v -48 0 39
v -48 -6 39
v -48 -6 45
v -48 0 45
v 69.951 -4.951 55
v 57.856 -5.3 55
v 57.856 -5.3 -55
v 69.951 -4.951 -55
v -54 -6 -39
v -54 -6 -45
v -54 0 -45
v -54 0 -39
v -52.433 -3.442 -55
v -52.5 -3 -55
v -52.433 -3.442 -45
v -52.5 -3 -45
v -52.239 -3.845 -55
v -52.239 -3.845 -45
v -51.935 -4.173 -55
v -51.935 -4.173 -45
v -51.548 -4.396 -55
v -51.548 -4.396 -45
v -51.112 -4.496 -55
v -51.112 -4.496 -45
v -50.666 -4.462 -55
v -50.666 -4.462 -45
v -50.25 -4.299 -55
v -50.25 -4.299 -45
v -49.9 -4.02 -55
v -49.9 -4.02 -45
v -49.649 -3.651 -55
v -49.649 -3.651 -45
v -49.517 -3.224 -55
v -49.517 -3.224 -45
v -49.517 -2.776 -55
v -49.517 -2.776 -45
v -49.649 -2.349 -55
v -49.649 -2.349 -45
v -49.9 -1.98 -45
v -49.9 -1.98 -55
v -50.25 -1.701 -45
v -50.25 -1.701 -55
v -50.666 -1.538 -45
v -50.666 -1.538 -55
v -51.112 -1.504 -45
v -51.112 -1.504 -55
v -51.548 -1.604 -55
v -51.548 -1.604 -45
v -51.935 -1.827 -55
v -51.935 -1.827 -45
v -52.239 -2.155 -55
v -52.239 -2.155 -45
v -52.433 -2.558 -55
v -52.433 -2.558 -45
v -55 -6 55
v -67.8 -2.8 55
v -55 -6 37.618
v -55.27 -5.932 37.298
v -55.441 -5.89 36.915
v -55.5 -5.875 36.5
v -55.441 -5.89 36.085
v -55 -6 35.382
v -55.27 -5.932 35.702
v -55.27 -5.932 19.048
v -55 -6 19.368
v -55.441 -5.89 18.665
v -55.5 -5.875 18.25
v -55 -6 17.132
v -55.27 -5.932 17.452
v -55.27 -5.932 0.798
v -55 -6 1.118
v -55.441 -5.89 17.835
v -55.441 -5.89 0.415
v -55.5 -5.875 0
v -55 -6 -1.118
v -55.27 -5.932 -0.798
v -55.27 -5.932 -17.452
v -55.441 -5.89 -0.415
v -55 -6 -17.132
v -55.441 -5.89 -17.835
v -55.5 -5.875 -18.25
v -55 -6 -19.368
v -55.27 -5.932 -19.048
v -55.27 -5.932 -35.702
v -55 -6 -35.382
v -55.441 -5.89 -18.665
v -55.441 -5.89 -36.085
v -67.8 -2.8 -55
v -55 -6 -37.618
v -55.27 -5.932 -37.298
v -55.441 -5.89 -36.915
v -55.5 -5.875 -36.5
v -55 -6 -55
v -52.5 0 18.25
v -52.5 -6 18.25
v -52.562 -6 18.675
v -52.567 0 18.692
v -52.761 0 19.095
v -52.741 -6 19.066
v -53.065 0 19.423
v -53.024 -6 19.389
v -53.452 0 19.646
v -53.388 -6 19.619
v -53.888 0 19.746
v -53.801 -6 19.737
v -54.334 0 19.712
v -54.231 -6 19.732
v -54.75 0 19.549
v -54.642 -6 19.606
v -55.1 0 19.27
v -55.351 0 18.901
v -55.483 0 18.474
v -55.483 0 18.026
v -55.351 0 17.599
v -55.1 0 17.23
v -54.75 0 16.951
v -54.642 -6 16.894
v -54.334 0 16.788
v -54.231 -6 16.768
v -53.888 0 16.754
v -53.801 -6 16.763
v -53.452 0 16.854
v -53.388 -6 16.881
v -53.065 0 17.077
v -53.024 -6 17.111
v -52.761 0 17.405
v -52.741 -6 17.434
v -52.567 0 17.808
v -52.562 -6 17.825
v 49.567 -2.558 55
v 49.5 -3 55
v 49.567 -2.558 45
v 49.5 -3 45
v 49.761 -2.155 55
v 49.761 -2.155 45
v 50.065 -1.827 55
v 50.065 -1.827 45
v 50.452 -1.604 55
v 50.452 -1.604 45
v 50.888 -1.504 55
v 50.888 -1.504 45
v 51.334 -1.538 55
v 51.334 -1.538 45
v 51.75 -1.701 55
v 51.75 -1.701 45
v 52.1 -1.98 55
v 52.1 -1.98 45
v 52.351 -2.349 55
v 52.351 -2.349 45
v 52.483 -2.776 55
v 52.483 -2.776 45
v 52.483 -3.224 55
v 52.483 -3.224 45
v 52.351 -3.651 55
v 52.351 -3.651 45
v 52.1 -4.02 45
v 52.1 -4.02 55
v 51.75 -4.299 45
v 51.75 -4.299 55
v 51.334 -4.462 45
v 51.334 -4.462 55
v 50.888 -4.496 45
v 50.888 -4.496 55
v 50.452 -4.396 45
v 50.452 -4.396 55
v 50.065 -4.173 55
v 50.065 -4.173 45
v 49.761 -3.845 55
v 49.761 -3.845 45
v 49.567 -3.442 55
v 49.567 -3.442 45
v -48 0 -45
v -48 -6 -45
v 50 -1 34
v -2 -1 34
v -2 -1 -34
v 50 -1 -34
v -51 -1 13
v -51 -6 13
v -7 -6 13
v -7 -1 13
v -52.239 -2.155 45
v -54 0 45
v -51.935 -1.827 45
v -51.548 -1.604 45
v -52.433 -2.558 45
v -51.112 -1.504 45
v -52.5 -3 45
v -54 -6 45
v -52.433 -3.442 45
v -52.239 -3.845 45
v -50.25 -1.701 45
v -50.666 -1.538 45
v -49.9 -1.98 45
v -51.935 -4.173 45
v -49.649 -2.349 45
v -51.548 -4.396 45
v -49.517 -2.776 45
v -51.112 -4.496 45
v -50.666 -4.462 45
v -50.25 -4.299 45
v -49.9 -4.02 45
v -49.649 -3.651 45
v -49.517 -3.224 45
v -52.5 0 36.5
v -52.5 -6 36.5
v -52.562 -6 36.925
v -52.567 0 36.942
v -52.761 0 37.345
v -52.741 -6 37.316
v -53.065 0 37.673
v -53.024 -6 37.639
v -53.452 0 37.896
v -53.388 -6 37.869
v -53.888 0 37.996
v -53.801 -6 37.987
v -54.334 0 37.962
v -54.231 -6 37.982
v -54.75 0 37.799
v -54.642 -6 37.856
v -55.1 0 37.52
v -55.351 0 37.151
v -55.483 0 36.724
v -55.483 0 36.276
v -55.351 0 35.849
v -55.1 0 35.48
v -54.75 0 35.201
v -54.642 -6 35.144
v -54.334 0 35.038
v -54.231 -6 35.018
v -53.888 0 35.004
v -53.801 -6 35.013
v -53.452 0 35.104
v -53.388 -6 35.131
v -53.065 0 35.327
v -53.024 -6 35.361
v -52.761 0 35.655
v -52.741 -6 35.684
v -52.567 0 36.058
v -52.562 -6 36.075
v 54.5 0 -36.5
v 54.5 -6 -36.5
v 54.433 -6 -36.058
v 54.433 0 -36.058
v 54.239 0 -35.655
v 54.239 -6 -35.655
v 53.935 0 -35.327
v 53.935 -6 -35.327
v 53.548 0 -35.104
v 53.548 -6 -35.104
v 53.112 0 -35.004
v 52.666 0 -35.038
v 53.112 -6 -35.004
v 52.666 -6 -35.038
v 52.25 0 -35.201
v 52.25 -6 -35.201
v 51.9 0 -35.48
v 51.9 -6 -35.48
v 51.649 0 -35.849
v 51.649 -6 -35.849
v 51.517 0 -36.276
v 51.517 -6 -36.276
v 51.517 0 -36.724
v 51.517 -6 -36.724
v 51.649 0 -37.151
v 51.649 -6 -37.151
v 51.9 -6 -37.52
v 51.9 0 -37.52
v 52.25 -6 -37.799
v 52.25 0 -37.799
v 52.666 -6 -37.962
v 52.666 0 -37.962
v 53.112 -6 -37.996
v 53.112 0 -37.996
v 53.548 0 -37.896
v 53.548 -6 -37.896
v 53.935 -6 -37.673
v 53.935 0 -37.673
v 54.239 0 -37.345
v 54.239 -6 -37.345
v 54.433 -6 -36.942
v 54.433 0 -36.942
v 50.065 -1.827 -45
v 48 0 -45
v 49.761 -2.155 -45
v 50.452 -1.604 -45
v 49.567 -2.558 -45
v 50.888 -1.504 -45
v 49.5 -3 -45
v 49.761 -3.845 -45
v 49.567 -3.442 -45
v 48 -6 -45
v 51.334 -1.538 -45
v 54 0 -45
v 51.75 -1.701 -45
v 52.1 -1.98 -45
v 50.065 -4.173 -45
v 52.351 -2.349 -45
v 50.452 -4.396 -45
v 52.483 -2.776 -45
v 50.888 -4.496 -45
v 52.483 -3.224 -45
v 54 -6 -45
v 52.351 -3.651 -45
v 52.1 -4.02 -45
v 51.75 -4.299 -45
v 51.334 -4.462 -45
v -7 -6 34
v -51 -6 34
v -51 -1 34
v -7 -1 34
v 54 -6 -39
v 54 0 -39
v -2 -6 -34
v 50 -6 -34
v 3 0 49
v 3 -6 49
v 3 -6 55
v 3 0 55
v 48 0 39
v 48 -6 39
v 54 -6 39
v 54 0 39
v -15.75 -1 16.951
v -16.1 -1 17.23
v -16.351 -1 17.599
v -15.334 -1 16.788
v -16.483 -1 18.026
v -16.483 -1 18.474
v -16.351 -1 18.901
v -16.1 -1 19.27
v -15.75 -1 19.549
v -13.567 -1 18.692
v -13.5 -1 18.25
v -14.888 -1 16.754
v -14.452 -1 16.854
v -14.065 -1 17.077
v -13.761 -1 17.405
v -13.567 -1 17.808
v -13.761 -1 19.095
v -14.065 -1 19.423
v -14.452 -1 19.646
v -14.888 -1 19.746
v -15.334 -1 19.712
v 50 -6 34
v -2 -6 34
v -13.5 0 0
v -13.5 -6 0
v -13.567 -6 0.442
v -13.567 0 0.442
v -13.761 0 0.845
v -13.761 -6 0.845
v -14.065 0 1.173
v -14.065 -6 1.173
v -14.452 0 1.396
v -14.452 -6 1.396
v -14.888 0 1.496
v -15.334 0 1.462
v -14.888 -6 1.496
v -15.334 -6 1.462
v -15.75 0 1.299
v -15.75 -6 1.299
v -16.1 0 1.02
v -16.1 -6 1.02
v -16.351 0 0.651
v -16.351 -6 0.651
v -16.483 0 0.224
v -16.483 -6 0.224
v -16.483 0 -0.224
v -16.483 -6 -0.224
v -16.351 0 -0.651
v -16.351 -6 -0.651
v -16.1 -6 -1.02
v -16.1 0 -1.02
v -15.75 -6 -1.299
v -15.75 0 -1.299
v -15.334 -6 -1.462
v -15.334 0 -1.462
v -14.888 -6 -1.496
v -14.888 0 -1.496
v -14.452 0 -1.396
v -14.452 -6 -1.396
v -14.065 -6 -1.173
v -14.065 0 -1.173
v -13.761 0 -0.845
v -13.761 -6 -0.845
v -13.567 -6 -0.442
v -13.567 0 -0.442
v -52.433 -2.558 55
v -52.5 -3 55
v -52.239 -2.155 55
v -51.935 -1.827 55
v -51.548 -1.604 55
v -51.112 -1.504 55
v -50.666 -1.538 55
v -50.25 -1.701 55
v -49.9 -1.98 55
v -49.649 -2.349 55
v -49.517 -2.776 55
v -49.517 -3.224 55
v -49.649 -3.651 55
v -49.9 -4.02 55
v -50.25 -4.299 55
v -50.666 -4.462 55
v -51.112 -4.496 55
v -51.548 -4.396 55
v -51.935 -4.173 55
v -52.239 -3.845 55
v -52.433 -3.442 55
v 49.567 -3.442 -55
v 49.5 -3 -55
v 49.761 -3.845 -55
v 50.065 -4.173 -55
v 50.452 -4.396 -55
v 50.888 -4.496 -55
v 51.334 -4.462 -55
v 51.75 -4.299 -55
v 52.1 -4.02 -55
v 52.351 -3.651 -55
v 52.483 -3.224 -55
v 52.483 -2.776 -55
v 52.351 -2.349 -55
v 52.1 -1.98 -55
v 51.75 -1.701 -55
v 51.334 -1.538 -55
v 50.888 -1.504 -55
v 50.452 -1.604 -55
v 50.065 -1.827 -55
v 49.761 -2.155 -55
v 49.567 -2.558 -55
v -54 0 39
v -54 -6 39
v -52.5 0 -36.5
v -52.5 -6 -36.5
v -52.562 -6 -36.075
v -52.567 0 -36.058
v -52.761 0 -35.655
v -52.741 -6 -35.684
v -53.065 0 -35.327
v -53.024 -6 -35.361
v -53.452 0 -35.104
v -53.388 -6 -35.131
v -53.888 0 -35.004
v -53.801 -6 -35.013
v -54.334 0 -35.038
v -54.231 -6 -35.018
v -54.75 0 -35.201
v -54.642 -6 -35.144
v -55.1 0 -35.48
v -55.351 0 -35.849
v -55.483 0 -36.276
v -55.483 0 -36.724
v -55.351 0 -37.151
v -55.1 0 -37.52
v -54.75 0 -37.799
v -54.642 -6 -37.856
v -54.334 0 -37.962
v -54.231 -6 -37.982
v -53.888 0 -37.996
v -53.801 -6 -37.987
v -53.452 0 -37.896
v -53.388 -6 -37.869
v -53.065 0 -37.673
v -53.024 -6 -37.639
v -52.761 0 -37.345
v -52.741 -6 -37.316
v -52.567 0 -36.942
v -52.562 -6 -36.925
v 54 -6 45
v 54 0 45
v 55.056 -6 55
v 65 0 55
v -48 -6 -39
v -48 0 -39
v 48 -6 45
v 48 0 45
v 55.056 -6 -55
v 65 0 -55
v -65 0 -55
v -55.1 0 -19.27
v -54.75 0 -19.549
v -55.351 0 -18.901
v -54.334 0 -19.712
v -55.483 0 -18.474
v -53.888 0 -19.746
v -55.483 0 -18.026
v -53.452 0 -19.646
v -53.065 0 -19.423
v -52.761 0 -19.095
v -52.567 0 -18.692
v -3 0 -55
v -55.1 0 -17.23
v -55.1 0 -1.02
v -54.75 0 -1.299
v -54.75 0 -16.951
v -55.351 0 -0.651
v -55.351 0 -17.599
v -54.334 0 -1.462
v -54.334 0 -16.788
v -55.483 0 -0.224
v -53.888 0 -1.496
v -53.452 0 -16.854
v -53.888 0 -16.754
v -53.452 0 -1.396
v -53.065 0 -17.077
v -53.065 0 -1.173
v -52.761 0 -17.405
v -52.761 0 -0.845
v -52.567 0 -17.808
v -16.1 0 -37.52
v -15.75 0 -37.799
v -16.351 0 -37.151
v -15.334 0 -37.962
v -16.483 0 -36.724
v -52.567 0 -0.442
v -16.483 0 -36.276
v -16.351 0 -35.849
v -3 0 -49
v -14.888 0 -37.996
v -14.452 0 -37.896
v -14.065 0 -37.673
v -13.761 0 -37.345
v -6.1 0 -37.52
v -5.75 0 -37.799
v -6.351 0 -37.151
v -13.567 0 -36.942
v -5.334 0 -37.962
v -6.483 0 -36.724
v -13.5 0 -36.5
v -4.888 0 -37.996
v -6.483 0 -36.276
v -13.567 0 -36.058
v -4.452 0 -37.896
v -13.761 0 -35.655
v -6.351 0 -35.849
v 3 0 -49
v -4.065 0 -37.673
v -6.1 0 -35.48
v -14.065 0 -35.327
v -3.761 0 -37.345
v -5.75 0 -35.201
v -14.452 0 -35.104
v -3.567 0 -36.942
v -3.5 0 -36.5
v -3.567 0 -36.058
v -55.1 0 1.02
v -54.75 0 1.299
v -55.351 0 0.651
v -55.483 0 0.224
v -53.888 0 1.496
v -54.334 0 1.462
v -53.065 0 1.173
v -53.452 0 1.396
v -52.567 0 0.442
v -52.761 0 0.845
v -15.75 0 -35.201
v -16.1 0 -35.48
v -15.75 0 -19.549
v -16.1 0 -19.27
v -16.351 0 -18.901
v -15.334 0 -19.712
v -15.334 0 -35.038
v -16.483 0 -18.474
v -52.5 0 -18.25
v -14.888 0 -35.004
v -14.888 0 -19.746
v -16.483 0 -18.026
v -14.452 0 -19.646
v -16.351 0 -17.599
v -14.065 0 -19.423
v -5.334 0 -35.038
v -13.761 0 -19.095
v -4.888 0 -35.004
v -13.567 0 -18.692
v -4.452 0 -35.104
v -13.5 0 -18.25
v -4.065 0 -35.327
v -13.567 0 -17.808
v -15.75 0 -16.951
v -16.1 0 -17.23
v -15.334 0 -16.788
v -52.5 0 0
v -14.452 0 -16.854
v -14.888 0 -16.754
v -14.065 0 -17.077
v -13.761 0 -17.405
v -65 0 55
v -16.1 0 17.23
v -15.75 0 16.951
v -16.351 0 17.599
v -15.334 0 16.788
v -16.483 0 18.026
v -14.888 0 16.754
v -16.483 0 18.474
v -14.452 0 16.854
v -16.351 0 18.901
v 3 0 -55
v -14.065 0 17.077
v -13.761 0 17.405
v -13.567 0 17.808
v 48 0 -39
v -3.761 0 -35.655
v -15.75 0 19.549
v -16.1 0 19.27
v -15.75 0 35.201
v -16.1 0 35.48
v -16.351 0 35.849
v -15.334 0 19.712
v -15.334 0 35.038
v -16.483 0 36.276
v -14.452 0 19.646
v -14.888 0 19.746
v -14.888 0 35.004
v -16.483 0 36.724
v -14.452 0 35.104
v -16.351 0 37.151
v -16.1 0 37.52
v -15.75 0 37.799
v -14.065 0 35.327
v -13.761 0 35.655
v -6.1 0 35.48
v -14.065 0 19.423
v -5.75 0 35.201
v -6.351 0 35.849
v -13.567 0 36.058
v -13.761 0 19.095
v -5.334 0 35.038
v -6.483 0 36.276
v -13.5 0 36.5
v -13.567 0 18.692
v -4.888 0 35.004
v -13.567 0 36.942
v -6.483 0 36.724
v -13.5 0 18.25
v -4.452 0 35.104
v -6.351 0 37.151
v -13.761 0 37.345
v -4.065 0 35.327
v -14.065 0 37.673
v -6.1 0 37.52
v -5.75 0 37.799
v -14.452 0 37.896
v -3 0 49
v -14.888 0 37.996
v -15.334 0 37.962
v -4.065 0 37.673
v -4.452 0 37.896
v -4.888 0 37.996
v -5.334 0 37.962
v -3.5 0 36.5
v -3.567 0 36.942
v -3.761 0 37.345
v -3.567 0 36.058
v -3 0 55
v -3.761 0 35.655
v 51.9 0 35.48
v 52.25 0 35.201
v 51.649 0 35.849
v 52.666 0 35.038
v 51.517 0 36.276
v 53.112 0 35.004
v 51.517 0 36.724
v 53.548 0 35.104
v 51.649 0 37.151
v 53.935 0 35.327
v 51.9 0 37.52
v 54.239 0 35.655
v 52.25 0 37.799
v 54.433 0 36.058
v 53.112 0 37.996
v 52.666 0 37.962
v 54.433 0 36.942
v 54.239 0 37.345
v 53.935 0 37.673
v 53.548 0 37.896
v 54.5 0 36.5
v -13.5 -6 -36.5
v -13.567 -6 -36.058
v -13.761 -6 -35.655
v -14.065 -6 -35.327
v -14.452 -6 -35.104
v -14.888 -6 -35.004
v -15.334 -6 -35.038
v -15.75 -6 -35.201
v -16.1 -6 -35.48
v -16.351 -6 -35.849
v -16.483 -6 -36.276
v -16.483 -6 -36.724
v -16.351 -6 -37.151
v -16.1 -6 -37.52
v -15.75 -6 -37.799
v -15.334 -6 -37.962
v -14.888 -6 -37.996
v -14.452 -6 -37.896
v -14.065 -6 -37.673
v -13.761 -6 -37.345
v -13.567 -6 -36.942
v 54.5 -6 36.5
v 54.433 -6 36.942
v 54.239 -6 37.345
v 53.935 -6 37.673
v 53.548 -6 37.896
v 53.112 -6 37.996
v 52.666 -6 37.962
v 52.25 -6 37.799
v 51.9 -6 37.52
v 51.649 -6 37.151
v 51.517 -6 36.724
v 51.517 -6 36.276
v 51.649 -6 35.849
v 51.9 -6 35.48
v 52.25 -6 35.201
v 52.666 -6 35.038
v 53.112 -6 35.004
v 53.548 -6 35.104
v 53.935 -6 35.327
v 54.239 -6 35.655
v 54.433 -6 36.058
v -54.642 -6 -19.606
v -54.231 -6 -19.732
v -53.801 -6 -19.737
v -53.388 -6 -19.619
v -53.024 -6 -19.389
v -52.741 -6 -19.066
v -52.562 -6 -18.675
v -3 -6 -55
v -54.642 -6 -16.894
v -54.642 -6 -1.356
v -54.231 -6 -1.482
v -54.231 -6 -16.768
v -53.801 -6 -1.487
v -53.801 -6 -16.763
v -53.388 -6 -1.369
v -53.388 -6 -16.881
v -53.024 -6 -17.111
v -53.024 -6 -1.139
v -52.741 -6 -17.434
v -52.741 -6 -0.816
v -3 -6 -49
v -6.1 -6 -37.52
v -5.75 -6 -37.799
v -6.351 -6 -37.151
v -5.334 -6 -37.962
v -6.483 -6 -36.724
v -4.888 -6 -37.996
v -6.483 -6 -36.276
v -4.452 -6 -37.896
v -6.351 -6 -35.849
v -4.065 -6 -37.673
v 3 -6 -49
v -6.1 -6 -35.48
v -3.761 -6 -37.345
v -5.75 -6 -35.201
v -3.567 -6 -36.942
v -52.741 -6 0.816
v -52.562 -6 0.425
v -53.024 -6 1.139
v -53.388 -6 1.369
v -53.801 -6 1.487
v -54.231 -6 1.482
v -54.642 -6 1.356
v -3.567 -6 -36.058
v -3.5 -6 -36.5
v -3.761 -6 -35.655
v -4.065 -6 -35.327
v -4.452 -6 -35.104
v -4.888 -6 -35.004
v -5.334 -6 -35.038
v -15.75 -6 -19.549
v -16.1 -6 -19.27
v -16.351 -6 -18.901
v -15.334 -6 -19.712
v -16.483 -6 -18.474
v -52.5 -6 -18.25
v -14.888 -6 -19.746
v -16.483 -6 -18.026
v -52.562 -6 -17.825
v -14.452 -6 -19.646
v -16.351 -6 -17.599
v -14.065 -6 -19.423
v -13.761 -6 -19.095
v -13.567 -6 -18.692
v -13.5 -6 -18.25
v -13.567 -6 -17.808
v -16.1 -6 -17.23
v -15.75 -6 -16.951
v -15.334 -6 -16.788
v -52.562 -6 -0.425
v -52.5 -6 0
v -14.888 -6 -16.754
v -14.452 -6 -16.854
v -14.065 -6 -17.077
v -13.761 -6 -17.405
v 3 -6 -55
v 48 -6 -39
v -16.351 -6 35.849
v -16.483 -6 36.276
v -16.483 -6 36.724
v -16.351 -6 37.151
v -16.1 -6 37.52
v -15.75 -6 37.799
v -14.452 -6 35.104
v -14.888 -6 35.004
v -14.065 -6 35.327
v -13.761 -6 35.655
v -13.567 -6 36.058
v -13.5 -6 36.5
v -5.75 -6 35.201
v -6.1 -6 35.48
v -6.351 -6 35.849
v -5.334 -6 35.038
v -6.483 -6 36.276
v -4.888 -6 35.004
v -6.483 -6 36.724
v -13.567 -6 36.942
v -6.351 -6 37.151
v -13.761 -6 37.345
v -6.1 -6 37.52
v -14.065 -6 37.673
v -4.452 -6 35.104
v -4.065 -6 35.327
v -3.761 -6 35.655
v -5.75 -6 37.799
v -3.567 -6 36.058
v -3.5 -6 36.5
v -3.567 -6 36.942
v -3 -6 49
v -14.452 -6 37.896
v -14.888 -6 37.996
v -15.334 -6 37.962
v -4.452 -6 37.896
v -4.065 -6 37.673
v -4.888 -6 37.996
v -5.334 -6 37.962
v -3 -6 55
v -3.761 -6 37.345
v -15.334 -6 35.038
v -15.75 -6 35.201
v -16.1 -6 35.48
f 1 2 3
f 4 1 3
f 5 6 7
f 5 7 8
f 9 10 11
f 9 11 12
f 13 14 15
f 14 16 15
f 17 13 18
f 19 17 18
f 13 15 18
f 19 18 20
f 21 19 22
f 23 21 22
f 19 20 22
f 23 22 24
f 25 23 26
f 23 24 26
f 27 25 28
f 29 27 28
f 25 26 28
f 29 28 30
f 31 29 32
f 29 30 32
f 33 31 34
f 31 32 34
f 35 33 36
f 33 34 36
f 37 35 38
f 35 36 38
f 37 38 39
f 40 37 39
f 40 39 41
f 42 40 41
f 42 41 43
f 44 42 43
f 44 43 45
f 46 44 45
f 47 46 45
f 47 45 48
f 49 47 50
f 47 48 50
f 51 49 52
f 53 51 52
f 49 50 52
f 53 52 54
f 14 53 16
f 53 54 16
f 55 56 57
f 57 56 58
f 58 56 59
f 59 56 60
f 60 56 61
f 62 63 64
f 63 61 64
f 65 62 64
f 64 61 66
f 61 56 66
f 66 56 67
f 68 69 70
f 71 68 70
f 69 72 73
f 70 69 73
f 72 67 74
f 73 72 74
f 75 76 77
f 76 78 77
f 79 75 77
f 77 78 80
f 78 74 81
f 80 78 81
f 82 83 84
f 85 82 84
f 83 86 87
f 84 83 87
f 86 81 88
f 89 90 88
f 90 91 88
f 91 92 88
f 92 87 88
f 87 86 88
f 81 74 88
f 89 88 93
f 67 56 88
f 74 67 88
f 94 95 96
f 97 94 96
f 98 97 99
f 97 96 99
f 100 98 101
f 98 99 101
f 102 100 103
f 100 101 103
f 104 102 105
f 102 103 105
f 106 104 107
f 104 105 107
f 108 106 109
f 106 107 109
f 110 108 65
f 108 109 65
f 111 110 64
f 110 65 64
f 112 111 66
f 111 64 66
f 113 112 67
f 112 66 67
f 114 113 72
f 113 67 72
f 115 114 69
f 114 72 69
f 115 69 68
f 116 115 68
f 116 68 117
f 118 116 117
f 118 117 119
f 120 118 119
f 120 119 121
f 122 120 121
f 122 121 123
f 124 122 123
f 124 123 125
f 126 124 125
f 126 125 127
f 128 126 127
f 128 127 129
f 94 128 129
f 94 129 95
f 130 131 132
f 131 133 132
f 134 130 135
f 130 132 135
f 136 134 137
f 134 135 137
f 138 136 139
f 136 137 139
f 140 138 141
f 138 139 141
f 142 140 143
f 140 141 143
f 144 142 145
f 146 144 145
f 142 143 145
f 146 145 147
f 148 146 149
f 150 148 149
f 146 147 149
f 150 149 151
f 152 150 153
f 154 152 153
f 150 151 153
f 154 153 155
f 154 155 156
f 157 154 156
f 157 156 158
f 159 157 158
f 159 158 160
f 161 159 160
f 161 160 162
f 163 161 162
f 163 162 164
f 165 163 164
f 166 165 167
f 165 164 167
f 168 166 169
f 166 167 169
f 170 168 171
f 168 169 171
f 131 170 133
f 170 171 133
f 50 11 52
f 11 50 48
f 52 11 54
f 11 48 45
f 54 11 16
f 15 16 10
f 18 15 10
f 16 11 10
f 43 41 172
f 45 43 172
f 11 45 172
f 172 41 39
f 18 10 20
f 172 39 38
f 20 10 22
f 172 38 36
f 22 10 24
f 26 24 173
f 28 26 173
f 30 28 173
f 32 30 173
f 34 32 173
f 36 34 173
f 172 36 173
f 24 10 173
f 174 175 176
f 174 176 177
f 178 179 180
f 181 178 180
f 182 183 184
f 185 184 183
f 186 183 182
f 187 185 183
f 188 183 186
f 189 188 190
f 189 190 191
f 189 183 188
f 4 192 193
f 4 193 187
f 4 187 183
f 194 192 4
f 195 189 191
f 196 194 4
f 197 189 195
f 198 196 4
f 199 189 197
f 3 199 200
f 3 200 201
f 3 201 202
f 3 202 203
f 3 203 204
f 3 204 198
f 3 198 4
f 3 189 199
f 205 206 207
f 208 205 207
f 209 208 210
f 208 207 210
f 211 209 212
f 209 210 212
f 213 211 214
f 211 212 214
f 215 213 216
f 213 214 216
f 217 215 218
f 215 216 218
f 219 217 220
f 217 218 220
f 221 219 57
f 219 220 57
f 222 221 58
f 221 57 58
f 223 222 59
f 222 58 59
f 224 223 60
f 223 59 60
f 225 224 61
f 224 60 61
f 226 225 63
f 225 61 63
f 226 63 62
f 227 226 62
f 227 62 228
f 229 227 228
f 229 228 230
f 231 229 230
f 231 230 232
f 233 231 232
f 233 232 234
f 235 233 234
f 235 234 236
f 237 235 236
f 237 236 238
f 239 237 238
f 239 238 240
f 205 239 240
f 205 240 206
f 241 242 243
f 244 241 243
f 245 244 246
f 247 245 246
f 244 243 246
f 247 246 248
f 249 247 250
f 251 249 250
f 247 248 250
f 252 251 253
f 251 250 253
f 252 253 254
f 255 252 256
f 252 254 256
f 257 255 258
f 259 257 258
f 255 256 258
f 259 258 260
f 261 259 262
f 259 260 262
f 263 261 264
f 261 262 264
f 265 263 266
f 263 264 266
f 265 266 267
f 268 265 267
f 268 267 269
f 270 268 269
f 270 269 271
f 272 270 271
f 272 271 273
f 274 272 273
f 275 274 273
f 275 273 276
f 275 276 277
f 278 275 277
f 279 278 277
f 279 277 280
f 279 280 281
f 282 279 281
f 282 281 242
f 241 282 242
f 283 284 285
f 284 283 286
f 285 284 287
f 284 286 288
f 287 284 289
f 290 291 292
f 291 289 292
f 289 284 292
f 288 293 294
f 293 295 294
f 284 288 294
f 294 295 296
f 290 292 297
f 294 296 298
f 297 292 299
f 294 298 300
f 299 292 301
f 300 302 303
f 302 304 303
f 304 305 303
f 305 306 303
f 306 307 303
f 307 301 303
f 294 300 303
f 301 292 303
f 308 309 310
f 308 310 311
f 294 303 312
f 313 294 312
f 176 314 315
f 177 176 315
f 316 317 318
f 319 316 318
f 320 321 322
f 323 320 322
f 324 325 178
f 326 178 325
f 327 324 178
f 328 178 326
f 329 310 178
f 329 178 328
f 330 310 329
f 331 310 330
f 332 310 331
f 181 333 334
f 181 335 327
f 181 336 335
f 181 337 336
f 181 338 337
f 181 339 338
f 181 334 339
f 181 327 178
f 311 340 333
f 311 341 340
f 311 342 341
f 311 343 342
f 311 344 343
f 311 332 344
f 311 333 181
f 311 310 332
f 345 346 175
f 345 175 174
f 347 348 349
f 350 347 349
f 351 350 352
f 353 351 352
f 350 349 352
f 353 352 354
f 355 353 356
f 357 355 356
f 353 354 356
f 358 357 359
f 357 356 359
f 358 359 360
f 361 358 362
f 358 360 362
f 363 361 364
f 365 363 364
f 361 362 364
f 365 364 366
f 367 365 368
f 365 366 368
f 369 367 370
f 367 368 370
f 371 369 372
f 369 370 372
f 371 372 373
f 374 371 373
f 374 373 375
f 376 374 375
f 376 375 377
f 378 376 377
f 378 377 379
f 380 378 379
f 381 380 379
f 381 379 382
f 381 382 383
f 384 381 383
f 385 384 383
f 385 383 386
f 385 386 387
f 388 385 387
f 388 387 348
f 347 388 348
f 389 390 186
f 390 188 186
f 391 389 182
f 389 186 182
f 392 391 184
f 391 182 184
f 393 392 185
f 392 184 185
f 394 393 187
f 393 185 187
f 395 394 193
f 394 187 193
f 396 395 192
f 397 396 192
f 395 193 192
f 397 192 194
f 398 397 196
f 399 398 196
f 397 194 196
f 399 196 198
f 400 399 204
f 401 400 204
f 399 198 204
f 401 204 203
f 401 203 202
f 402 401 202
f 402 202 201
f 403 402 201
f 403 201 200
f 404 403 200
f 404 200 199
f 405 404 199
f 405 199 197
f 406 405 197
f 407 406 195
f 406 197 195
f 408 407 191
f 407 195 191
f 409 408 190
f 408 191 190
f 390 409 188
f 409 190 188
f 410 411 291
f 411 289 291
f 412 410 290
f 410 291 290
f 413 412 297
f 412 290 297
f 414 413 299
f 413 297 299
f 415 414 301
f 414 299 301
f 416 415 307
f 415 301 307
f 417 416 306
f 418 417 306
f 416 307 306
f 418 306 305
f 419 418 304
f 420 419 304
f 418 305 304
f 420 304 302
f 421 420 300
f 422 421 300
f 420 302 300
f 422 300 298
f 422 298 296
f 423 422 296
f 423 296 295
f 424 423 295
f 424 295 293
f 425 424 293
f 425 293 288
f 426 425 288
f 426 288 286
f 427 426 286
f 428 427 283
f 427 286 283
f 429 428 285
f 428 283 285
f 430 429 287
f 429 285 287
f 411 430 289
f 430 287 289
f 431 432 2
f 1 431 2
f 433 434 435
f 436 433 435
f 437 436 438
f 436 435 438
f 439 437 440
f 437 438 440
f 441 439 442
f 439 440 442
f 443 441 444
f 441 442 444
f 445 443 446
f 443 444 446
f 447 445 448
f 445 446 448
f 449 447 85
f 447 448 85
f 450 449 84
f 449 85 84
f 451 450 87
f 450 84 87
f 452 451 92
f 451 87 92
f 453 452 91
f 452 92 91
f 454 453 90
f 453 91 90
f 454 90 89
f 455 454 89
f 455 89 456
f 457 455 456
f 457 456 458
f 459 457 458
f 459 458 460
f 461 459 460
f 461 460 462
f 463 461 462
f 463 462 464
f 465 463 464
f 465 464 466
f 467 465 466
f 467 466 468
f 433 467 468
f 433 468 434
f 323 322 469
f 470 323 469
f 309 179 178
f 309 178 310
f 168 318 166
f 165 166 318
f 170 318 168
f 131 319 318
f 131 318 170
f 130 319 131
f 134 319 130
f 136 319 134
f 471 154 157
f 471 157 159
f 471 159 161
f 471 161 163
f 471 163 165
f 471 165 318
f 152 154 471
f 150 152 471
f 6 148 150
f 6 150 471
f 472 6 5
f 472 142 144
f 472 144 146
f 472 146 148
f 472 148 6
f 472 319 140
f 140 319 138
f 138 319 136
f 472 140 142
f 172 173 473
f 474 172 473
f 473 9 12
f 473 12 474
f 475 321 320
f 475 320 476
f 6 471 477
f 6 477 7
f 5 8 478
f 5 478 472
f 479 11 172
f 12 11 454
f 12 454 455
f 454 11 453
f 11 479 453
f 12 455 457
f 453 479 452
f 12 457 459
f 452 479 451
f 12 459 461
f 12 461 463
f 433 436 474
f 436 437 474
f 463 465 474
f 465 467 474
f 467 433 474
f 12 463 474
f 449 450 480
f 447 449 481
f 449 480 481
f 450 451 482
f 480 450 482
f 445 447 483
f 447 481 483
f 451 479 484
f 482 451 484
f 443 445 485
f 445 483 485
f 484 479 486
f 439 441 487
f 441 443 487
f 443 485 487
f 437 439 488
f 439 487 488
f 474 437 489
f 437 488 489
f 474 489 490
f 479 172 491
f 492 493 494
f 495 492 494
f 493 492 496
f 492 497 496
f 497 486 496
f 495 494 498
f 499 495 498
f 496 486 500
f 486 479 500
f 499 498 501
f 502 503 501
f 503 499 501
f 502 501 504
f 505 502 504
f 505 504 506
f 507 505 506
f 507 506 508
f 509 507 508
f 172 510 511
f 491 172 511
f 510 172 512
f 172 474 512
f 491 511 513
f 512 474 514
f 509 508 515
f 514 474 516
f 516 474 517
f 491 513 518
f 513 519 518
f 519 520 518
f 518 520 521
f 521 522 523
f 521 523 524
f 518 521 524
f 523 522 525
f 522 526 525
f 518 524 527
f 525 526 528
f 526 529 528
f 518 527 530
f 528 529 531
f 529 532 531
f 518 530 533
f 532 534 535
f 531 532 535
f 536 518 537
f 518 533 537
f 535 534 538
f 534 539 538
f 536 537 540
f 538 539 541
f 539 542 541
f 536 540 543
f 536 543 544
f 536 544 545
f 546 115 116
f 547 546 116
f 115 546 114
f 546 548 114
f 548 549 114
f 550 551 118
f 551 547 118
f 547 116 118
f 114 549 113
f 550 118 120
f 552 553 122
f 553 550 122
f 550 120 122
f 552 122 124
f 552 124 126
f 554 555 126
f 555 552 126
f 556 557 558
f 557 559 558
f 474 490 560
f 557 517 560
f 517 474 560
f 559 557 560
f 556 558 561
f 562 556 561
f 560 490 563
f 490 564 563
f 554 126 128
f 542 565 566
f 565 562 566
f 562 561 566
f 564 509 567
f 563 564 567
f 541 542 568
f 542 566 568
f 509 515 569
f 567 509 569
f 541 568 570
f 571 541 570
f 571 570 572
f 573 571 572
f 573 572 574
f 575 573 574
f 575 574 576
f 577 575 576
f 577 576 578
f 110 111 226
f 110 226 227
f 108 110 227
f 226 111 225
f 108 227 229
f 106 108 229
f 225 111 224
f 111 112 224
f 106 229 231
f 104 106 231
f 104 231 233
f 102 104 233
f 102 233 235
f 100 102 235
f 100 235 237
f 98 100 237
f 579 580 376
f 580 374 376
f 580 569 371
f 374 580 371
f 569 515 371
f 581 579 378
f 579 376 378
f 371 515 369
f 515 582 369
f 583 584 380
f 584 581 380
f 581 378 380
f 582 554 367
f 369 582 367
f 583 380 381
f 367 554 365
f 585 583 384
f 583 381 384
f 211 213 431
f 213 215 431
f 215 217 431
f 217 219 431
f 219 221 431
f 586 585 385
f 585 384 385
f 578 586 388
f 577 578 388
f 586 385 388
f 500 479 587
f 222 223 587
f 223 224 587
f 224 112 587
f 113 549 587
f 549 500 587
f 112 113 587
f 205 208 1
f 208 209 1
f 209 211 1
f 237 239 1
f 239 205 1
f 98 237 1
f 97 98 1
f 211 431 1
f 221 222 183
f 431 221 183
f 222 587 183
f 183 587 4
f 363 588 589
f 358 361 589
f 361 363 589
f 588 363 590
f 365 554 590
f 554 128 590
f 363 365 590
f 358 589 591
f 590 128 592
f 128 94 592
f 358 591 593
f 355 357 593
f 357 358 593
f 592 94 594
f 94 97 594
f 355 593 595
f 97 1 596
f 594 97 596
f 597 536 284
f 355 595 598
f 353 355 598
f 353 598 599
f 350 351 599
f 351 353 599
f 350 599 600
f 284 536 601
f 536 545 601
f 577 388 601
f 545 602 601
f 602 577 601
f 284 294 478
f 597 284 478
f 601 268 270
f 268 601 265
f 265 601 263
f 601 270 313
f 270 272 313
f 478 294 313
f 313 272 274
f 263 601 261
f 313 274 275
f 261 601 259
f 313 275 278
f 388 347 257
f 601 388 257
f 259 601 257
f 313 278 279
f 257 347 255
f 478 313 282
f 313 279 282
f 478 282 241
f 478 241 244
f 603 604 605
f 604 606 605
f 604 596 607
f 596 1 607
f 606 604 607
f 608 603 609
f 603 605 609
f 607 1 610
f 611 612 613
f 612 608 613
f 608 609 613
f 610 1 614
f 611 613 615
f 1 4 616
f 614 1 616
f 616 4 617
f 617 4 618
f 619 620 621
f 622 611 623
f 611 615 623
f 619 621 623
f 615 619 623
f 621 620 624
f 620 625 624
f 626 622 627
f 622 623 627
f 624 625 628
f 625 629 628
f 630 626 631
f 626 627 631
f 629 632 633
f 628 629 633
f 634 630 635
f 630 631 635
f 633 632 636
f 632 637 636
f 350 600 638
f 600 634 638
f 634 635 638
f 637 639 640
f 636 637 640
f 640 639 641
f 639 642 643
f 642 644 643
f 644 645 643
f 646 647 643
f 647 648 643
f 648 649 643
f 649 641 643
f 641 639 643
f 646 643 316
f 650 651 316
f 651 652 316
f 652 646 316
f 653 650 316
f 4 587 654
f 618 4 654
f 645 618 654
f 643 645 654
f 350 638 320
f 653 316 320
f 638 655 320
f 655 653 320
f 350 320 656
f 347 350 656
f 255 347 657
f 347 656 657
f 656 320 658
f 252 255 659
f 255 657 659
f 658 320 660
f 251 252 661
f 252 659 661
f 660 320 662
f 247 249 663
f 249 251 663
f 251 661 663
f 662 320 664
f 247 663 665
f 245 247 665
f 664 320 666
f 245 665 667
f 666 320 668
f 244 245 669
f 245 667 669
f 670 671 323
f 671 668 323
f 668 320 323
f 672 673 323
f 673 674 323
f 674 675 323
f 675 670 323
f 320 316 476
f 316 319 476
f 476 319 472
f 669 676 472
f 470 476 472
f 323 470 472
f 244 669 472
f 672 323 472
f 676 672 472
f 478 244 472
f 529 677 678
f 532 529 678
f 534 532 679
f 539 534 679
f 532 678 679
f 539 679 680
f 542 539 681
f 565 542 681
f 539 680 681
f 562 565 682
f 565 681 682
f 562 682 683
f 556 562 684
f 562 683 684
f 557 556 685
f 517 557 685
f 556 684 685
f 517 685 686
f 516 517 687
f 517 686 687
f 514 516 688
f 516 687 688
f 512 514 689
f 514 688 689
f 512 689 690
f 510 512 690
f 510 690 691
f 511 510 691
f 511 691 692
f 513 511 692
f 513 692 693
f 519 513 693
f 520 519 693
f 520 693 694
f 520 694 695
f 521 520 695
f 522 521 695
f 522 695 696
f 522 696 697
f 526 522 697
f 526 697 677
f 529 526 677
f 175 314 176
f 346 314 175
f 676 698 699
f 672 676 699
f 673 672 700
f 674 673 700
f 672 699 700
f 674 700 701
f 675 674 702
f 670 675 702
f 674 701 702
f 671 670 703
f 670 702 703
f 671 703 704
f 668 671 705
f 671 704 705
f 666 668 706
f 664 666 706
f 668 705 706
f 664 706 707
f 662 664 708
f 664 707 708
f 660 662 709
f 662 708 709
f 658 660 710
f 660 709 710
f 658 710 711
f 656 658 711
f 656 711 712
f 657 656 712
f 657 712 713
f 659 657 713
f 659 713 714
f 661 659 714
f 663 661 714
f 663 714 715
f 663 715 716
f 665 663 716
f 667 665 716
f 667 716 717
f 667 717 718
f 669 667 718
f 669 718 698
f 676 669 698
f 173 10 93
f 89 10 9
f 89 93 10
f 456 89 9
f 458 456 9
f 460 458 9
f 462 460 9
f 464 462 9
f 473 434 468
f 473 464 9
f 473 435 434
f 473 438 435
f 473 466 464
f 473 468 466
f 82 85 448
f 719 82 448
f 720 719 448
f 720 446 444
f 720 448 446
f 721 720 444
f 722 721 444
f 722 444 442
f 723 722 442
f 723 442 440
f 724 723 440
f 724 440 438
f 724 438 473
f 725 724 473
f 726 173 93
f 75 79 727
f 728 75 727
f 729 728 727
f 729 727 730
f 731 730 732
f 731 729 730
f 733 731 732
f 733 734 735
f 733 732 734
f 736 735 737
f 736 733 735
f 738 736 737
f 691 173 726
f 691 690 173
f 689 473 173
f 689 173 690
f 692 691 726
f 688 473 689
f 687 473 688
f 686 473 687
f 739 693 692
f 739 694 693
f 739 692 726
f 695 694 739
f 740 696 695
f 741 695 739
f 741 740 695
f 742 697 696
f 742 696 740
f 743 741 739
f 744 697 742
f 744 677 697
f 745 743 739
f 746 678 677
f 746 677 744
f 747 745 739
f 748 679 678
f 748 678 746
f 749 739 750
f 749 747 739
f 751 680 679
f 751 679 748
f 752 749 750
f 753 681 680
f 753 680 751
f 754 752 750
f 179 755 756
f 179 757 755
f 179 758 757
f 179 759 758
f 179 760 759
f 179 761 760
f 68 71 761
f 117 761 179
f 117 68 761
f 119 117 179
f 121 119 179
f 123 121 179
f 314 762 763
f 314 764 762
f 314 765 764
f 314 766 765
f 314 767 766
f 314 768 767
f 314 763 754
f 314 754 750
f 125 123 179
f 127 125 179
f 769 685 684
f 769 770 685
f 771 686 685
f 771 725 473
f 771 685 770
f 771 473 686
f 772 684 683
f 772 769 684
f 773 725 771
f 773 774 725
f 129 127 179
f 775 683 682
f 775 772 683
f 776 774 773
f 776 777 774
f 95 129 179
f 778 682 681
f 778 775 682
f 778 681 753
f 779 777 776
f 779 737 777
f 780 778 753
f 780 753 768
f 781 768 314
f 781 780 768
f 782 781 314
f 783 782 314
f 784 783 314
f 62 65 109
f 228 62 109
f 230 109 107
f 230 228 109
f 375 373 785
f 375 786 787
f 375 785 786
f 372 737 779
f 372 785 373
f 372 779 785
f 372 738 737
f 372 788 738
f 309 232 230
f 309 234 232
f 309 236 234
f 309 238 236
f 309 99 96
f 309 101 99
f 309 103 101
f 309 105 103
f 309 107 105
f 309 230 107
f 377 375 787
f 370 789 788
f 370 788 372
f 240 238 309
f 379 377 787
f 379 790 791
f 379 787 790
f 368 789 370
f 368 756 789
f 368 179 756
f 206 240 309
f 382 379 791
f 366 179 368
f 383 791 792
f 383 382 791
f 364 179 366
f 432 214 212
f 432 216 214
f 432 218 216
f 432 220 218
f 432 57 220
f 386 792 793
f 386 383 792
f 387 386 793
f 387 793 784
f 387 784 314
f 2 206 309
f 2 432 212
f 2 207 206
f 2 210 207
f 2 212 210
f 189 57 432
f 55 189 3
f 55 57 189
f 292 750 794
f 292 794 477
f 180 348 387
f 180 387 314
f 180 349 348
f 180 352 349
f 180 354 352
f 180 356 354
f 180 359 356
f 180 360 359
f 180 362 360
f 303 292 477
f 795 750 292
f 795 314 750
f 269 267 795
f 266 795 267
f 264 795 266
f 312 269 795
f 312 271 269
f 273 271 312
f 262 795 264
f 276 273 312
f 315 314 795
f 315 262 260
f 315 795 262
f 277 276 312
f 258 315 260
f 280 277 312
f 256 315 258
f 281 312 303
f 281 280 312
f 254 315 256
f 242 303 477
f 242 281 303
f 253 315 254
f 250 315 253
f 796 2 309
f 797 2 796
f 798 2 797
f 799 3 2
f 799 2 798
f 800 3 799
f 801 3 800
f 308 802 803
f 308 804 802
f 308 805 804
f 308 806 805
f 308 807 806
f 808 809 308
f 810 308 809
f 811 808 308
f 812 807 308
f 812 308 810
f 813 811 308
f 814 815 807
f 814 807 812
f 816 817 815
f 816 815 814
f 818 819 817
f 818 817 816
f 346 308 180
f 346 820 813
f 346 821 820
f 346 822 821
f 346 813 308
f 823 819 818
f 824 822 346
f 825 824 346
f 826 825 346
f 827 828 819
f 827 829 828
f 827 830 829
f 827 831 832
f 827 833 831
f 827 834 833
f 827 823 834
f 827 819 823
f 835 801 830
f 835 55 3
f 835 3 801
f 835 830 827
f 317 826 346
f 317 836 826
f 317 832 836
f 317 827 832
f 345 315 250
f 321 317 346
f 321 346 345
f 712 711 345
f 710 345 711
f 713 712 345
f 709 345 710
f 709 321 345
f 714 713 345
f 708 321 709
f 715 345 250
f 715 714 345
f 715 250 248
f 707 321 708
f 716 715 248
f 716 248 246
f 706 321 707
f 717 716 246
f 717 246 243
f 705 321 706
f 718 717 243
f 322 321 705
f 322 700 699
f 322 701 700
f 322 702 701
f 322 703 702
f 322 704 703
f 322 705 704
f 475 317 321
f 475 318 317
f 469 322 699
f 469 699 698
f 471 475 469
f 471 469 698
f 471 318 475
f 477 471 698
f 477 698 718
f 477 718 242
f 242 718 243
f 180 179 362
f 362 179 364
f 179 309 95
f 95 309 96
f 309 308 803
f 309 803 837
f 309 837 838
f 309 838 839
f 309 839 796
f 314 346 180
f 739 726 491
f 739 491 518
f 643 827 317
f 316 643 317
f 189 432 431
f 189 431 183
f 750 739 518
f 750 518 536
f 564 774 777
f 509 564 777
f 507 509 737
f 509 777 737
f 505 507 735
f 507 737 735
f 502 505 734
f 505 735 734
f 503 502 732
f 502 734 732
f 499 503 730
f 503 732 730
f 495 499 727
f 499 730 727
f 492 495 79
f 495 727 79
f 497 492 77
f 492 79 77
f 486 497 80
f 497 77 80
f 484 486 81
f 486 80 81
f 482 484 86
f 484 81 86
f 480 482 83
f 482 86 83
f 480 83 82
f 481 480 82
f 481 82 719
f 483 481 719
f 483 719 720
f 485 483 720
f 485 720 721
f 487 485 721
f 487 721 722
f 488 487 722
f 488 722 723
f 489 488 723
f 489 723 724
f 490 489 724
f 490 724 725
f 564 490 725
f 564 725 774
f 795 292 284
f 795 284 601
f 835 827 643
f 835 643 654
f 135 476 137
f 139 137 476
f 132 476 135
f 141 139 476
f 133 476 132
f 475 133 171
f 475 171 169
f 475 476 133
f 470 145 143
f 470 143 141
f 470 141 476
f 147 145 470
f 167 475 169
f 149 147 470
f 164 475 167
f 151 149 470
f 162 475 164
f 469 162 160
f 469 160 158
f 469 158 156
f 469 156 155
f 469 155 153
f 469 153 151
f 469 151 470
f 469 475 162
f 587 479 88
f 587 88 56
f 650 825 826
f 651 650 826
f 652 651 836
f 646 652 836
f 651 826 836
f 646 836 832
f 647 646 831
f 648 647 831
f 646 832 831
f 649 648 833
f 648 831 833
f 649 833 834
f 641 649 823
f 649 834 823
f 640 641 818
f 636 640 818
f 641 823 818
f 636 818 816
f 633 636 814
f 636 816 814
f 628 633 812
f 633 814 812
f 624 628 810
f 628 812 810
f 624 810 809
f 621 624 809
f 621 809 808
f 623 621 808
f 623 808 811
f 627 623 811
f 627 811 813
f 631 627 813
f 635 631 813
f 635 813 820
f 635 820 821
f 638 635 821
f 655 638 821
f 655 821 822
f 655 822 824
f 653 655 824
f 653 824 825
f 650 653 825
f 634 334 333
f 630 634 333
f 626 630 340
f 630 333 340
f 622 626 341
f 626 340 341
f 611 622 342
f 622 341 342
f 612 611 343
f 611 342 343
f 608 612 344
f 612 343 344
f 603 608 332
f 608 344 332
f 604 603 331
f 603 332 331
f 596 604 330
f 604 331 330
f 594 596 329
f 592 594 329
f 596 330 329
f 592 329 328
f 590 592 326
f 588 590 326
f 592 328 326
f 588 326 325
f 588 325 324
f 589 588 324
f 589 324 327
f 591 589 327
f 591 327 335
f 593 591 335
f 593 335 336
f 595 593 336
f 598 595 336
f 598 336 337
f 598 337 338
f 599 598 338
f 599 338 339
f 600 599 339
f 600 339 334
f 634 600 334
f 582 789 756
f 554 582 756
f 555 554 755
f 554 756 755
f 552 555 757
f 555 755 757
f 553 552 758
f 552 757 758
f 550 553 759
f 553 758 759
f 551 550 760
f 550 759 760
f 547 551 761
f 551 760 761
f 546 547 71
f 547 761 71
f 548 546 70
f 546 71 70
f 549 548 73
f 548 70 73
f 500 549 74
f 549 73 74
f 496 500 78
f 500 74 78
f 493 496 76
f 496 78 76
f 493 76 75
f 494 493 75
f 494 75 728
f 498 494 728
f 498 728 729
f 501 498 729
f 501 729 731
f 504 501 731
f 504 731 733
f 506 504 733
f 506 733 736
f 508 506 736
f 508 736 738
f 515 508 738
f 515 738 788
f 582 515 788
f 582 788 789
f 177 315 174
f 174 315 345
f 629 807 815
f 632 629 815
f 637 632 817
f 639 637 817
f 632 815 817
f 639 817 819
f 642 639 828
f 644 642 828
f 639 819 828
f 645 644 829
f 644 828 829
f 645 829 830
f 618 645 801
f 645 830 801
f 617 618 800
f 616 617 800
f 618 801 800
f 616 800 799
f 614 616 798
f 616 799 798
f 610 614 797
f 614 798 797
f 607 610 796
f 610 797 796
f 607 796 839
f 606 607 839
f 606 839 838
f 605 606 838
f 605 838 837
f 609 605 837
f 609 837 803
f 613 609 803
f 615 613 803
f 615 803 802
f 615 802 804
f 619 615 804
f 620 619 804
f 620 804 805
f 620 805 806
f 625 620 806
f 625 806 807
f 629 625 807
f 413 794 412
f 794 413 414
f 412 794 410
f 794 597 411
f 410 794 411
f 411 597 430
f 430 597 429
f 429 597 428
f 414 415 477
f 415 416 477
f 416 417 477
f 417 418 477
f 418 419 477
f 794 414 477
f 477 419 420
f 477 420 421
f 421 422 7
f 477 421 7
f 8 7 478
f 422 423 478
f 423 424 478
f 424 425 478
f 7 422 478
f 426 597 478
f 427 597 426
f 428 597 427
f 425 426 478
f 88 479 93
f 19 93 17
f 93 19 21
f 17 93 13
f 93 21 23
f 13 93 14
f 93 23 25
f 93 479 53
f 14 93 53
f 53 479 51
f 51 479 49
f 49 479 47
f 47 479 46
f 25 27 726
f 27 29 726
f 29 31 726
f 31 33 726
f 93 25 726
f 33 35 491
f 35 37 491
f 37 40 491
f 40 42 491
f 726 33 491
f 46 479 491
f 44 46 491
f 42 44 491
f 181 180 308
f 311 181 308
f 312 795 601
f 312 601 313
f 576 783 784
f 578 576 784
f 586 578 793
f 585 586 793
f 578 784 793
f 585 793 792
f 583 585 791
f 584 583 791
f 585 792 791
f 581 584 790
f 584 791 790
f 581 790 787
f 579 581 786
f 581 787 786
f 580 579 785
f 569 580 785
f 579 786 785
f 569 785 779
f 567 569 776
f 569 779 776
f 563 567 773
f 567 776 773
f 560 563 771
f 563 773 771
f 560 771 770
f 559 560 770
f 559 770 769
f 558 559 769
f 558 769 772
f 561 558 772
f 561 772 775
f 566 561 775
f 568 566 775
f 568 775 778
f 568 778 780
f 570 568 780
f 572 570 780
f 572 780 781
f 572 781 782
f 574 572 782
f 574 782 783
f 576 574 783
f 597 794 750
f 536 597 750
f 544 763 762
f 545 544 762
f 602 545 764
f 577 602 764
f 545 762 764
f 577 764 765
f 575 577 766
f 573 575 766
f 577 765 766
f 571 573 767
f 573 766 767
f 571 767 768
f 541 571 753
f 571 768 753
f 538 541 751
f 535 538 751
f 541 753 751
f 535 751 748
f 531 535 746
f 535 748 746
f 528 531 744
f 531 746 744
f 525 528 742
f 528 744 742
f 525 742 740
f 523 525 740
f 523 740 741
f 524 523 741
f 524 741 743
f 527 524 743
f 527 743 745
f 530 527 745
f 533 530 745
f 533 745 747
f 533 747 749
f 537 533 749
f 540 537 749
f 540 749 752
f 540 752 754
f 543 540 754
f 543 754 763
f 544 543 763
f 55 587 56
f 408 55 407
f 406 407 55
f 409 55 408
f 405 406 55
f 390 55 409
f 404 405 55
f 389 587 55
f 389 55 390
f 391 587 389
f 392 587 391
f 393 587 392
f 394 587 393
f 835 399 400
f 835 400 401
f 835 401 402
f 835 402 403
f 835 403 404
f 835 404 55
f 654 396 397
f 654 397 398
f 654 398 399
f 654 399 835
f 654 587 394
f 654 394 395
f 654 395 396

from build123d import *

# Parameters (mm, degrees)
F0_W      = 140
F0_H      = 110
F1_DEPTH  = 6
F3_D      = 3
F3_DEPTH  = 10
F3_TIP    = 0.9012909285
F5_D      = 3
F5_DEPTH  = 10
F5_TIP    = 0.9012909285
F6_SIZE   = 5
F7_W      = 6
F7_H      = 6
F8_DEPTH  = 6.001
F9_W      = 52
F9_H      = 68
F9_W_2    = 44
F9_H_2    = 21
F10_DEPTH = 5
F11_R     = 1.5
F12_DEPTH = 25
F14_DEPTH = 110.001
F16_DEPTH = 110.001


with BuildPart() as f1:
    # F0 (on Front) → F1 (new body)
    with BuildSketch(Plane.XZ):
        Rectangle(F0_W, F0_H)
    extrude(amount=F1_DEPTH)

    # F3
    with Locations(Plane(origin=(0, 0, -55), x_dir=(1, 0, 0), z_dir=(0, 0, -1))):
        with Locations((-51, 3), (51, 3)):
            Hole(F3_D / 2, depth=F3_DEPTH)
            with Locations((0, 0, -(F3_DEPTH + F3_TIP / 2))):  # 118° drill point
                Cone(0, F3_D / 2, F3_TIP, mode=Mode.SUBTRACT)

    # F5
    with Locations(Plane.XY.offset(55)):
        with Locations((51, -3), (-51, -3)):
            Hole(F5_D / 2, depth=F5_DEPTH)
            with Locations((0, 0, -(F5_DEPTH + F5_TIP / 2))):  # 118° drill point
                Cone(0, F5_D / 2, F5_TIP, mode=Mode.SUBTRACT)

    # F6
    f6_edges = [f1.edges().sort_by_distance(p)[0] for p in [
        (-70, 0, 0),
        (70, 0, 0),
    ]]
    chamfer(f6_edges, length=F6_SIZE)

    # F7 (on face) → F8 (cut, through all)
    with BuildSketch(Plane.XZ.offset(6)):
        with Locations((-51, -42)):
            Rectangle(F7_W, F7_H)
        with Locations((51, -42)):
            Rectangle(F7_W, F7_H)
        with Locations((51, 42)):
            Rectangle(F7_W, F7_H)
        with Locations((-51, 42)):
            Rectangle(F7_W, F7_H)
        with Locations((0, -52)):
            Rectangle(F7_W, F7_H)
        with Locations((0, 52)):
            Rectangle(F7_W, F7_H)
    extrude(amount=-F8_DEPTH, mode=Mode.SUBTRACT)

    # F9 (on face) → F10 (cut)
    with BuildSketch(Plane.XZ.offset(6)):
        with Locations((24, 0)):
            Rectangle(F9_W, F9_H)
        with Locations((-29, 23.5)):
            Rectangle(F9_W_2, F9_H_2)
    extrude(amount=-F10_DEPTH, mode=Mode.SUBTRACT)

    # F11 (on face) → F12 (cut)
    with BuildSketch(Plane.XZ.offset(6)):
        with Locations((-54, 36.5)):
            Circle(F11_R)
        with Locations((-5, 36.5)):
            Circle(F11_R)
        with Locations((-15, 36.5)):
            Circle(F11_R)
        with Locations((53, 36.5)):
            Circle(F11_R)
        with Locations((-54, 18.25)):
            Circle(F11_R)
        with Locations((-15, 18.25)):
            Circle(F11_R)
        with Locations((-54, 0)):
            Circle(F11_R)
        with Locations((-15, 0)):
            Circle(F11_R)
        with Locations((-54, -36.5)):
            Circle(F11_R)
        with Locations((-5, -36.5)):
            Circle(F11_R)
        with Locations((-15, -36.5)):
            Circle(F11_R)
        with Locations((53, -36.5)):
            Circle(F11_R)
        with Locations((-54, -18.25)):
            Circle(F11_R)
        with Locations((-15, -18.25)):
            Circle(F11_R)
    extrude(amount=-F12_DEPTH, mode=Mode.SUBTRACT)

    # F13 (on face) → F14 (cut, through all)
    with BuildSketch(Plane(origin=(0, 0, -55), x_dir=(1, 0, 0), z_dir=(0, 0, -1))):
        Polygon((70, 6), (55.0561677185, 6), (57.8561677185, 5.3), (69.95113754, 4.95113754), (70, 5), align=None)
    extrude(amount=-F14_DEPTH, mode=Mode.SUBTRACT)

    # F15 (on face) → F16 (cut, through all)
    with BuildSketch(Plane(origin=(0, 0, -55), x_dir=(1, 0, 0), z_dir=(0, 0, -1))):
        Polygon((-70, 5), (-67.8, 2.8), (-55, 6), (-70, 6), align=None)
    extrude(amount=-F16_DEPTH, mode=Mode.SUBTRACT)


solid = f1.part
